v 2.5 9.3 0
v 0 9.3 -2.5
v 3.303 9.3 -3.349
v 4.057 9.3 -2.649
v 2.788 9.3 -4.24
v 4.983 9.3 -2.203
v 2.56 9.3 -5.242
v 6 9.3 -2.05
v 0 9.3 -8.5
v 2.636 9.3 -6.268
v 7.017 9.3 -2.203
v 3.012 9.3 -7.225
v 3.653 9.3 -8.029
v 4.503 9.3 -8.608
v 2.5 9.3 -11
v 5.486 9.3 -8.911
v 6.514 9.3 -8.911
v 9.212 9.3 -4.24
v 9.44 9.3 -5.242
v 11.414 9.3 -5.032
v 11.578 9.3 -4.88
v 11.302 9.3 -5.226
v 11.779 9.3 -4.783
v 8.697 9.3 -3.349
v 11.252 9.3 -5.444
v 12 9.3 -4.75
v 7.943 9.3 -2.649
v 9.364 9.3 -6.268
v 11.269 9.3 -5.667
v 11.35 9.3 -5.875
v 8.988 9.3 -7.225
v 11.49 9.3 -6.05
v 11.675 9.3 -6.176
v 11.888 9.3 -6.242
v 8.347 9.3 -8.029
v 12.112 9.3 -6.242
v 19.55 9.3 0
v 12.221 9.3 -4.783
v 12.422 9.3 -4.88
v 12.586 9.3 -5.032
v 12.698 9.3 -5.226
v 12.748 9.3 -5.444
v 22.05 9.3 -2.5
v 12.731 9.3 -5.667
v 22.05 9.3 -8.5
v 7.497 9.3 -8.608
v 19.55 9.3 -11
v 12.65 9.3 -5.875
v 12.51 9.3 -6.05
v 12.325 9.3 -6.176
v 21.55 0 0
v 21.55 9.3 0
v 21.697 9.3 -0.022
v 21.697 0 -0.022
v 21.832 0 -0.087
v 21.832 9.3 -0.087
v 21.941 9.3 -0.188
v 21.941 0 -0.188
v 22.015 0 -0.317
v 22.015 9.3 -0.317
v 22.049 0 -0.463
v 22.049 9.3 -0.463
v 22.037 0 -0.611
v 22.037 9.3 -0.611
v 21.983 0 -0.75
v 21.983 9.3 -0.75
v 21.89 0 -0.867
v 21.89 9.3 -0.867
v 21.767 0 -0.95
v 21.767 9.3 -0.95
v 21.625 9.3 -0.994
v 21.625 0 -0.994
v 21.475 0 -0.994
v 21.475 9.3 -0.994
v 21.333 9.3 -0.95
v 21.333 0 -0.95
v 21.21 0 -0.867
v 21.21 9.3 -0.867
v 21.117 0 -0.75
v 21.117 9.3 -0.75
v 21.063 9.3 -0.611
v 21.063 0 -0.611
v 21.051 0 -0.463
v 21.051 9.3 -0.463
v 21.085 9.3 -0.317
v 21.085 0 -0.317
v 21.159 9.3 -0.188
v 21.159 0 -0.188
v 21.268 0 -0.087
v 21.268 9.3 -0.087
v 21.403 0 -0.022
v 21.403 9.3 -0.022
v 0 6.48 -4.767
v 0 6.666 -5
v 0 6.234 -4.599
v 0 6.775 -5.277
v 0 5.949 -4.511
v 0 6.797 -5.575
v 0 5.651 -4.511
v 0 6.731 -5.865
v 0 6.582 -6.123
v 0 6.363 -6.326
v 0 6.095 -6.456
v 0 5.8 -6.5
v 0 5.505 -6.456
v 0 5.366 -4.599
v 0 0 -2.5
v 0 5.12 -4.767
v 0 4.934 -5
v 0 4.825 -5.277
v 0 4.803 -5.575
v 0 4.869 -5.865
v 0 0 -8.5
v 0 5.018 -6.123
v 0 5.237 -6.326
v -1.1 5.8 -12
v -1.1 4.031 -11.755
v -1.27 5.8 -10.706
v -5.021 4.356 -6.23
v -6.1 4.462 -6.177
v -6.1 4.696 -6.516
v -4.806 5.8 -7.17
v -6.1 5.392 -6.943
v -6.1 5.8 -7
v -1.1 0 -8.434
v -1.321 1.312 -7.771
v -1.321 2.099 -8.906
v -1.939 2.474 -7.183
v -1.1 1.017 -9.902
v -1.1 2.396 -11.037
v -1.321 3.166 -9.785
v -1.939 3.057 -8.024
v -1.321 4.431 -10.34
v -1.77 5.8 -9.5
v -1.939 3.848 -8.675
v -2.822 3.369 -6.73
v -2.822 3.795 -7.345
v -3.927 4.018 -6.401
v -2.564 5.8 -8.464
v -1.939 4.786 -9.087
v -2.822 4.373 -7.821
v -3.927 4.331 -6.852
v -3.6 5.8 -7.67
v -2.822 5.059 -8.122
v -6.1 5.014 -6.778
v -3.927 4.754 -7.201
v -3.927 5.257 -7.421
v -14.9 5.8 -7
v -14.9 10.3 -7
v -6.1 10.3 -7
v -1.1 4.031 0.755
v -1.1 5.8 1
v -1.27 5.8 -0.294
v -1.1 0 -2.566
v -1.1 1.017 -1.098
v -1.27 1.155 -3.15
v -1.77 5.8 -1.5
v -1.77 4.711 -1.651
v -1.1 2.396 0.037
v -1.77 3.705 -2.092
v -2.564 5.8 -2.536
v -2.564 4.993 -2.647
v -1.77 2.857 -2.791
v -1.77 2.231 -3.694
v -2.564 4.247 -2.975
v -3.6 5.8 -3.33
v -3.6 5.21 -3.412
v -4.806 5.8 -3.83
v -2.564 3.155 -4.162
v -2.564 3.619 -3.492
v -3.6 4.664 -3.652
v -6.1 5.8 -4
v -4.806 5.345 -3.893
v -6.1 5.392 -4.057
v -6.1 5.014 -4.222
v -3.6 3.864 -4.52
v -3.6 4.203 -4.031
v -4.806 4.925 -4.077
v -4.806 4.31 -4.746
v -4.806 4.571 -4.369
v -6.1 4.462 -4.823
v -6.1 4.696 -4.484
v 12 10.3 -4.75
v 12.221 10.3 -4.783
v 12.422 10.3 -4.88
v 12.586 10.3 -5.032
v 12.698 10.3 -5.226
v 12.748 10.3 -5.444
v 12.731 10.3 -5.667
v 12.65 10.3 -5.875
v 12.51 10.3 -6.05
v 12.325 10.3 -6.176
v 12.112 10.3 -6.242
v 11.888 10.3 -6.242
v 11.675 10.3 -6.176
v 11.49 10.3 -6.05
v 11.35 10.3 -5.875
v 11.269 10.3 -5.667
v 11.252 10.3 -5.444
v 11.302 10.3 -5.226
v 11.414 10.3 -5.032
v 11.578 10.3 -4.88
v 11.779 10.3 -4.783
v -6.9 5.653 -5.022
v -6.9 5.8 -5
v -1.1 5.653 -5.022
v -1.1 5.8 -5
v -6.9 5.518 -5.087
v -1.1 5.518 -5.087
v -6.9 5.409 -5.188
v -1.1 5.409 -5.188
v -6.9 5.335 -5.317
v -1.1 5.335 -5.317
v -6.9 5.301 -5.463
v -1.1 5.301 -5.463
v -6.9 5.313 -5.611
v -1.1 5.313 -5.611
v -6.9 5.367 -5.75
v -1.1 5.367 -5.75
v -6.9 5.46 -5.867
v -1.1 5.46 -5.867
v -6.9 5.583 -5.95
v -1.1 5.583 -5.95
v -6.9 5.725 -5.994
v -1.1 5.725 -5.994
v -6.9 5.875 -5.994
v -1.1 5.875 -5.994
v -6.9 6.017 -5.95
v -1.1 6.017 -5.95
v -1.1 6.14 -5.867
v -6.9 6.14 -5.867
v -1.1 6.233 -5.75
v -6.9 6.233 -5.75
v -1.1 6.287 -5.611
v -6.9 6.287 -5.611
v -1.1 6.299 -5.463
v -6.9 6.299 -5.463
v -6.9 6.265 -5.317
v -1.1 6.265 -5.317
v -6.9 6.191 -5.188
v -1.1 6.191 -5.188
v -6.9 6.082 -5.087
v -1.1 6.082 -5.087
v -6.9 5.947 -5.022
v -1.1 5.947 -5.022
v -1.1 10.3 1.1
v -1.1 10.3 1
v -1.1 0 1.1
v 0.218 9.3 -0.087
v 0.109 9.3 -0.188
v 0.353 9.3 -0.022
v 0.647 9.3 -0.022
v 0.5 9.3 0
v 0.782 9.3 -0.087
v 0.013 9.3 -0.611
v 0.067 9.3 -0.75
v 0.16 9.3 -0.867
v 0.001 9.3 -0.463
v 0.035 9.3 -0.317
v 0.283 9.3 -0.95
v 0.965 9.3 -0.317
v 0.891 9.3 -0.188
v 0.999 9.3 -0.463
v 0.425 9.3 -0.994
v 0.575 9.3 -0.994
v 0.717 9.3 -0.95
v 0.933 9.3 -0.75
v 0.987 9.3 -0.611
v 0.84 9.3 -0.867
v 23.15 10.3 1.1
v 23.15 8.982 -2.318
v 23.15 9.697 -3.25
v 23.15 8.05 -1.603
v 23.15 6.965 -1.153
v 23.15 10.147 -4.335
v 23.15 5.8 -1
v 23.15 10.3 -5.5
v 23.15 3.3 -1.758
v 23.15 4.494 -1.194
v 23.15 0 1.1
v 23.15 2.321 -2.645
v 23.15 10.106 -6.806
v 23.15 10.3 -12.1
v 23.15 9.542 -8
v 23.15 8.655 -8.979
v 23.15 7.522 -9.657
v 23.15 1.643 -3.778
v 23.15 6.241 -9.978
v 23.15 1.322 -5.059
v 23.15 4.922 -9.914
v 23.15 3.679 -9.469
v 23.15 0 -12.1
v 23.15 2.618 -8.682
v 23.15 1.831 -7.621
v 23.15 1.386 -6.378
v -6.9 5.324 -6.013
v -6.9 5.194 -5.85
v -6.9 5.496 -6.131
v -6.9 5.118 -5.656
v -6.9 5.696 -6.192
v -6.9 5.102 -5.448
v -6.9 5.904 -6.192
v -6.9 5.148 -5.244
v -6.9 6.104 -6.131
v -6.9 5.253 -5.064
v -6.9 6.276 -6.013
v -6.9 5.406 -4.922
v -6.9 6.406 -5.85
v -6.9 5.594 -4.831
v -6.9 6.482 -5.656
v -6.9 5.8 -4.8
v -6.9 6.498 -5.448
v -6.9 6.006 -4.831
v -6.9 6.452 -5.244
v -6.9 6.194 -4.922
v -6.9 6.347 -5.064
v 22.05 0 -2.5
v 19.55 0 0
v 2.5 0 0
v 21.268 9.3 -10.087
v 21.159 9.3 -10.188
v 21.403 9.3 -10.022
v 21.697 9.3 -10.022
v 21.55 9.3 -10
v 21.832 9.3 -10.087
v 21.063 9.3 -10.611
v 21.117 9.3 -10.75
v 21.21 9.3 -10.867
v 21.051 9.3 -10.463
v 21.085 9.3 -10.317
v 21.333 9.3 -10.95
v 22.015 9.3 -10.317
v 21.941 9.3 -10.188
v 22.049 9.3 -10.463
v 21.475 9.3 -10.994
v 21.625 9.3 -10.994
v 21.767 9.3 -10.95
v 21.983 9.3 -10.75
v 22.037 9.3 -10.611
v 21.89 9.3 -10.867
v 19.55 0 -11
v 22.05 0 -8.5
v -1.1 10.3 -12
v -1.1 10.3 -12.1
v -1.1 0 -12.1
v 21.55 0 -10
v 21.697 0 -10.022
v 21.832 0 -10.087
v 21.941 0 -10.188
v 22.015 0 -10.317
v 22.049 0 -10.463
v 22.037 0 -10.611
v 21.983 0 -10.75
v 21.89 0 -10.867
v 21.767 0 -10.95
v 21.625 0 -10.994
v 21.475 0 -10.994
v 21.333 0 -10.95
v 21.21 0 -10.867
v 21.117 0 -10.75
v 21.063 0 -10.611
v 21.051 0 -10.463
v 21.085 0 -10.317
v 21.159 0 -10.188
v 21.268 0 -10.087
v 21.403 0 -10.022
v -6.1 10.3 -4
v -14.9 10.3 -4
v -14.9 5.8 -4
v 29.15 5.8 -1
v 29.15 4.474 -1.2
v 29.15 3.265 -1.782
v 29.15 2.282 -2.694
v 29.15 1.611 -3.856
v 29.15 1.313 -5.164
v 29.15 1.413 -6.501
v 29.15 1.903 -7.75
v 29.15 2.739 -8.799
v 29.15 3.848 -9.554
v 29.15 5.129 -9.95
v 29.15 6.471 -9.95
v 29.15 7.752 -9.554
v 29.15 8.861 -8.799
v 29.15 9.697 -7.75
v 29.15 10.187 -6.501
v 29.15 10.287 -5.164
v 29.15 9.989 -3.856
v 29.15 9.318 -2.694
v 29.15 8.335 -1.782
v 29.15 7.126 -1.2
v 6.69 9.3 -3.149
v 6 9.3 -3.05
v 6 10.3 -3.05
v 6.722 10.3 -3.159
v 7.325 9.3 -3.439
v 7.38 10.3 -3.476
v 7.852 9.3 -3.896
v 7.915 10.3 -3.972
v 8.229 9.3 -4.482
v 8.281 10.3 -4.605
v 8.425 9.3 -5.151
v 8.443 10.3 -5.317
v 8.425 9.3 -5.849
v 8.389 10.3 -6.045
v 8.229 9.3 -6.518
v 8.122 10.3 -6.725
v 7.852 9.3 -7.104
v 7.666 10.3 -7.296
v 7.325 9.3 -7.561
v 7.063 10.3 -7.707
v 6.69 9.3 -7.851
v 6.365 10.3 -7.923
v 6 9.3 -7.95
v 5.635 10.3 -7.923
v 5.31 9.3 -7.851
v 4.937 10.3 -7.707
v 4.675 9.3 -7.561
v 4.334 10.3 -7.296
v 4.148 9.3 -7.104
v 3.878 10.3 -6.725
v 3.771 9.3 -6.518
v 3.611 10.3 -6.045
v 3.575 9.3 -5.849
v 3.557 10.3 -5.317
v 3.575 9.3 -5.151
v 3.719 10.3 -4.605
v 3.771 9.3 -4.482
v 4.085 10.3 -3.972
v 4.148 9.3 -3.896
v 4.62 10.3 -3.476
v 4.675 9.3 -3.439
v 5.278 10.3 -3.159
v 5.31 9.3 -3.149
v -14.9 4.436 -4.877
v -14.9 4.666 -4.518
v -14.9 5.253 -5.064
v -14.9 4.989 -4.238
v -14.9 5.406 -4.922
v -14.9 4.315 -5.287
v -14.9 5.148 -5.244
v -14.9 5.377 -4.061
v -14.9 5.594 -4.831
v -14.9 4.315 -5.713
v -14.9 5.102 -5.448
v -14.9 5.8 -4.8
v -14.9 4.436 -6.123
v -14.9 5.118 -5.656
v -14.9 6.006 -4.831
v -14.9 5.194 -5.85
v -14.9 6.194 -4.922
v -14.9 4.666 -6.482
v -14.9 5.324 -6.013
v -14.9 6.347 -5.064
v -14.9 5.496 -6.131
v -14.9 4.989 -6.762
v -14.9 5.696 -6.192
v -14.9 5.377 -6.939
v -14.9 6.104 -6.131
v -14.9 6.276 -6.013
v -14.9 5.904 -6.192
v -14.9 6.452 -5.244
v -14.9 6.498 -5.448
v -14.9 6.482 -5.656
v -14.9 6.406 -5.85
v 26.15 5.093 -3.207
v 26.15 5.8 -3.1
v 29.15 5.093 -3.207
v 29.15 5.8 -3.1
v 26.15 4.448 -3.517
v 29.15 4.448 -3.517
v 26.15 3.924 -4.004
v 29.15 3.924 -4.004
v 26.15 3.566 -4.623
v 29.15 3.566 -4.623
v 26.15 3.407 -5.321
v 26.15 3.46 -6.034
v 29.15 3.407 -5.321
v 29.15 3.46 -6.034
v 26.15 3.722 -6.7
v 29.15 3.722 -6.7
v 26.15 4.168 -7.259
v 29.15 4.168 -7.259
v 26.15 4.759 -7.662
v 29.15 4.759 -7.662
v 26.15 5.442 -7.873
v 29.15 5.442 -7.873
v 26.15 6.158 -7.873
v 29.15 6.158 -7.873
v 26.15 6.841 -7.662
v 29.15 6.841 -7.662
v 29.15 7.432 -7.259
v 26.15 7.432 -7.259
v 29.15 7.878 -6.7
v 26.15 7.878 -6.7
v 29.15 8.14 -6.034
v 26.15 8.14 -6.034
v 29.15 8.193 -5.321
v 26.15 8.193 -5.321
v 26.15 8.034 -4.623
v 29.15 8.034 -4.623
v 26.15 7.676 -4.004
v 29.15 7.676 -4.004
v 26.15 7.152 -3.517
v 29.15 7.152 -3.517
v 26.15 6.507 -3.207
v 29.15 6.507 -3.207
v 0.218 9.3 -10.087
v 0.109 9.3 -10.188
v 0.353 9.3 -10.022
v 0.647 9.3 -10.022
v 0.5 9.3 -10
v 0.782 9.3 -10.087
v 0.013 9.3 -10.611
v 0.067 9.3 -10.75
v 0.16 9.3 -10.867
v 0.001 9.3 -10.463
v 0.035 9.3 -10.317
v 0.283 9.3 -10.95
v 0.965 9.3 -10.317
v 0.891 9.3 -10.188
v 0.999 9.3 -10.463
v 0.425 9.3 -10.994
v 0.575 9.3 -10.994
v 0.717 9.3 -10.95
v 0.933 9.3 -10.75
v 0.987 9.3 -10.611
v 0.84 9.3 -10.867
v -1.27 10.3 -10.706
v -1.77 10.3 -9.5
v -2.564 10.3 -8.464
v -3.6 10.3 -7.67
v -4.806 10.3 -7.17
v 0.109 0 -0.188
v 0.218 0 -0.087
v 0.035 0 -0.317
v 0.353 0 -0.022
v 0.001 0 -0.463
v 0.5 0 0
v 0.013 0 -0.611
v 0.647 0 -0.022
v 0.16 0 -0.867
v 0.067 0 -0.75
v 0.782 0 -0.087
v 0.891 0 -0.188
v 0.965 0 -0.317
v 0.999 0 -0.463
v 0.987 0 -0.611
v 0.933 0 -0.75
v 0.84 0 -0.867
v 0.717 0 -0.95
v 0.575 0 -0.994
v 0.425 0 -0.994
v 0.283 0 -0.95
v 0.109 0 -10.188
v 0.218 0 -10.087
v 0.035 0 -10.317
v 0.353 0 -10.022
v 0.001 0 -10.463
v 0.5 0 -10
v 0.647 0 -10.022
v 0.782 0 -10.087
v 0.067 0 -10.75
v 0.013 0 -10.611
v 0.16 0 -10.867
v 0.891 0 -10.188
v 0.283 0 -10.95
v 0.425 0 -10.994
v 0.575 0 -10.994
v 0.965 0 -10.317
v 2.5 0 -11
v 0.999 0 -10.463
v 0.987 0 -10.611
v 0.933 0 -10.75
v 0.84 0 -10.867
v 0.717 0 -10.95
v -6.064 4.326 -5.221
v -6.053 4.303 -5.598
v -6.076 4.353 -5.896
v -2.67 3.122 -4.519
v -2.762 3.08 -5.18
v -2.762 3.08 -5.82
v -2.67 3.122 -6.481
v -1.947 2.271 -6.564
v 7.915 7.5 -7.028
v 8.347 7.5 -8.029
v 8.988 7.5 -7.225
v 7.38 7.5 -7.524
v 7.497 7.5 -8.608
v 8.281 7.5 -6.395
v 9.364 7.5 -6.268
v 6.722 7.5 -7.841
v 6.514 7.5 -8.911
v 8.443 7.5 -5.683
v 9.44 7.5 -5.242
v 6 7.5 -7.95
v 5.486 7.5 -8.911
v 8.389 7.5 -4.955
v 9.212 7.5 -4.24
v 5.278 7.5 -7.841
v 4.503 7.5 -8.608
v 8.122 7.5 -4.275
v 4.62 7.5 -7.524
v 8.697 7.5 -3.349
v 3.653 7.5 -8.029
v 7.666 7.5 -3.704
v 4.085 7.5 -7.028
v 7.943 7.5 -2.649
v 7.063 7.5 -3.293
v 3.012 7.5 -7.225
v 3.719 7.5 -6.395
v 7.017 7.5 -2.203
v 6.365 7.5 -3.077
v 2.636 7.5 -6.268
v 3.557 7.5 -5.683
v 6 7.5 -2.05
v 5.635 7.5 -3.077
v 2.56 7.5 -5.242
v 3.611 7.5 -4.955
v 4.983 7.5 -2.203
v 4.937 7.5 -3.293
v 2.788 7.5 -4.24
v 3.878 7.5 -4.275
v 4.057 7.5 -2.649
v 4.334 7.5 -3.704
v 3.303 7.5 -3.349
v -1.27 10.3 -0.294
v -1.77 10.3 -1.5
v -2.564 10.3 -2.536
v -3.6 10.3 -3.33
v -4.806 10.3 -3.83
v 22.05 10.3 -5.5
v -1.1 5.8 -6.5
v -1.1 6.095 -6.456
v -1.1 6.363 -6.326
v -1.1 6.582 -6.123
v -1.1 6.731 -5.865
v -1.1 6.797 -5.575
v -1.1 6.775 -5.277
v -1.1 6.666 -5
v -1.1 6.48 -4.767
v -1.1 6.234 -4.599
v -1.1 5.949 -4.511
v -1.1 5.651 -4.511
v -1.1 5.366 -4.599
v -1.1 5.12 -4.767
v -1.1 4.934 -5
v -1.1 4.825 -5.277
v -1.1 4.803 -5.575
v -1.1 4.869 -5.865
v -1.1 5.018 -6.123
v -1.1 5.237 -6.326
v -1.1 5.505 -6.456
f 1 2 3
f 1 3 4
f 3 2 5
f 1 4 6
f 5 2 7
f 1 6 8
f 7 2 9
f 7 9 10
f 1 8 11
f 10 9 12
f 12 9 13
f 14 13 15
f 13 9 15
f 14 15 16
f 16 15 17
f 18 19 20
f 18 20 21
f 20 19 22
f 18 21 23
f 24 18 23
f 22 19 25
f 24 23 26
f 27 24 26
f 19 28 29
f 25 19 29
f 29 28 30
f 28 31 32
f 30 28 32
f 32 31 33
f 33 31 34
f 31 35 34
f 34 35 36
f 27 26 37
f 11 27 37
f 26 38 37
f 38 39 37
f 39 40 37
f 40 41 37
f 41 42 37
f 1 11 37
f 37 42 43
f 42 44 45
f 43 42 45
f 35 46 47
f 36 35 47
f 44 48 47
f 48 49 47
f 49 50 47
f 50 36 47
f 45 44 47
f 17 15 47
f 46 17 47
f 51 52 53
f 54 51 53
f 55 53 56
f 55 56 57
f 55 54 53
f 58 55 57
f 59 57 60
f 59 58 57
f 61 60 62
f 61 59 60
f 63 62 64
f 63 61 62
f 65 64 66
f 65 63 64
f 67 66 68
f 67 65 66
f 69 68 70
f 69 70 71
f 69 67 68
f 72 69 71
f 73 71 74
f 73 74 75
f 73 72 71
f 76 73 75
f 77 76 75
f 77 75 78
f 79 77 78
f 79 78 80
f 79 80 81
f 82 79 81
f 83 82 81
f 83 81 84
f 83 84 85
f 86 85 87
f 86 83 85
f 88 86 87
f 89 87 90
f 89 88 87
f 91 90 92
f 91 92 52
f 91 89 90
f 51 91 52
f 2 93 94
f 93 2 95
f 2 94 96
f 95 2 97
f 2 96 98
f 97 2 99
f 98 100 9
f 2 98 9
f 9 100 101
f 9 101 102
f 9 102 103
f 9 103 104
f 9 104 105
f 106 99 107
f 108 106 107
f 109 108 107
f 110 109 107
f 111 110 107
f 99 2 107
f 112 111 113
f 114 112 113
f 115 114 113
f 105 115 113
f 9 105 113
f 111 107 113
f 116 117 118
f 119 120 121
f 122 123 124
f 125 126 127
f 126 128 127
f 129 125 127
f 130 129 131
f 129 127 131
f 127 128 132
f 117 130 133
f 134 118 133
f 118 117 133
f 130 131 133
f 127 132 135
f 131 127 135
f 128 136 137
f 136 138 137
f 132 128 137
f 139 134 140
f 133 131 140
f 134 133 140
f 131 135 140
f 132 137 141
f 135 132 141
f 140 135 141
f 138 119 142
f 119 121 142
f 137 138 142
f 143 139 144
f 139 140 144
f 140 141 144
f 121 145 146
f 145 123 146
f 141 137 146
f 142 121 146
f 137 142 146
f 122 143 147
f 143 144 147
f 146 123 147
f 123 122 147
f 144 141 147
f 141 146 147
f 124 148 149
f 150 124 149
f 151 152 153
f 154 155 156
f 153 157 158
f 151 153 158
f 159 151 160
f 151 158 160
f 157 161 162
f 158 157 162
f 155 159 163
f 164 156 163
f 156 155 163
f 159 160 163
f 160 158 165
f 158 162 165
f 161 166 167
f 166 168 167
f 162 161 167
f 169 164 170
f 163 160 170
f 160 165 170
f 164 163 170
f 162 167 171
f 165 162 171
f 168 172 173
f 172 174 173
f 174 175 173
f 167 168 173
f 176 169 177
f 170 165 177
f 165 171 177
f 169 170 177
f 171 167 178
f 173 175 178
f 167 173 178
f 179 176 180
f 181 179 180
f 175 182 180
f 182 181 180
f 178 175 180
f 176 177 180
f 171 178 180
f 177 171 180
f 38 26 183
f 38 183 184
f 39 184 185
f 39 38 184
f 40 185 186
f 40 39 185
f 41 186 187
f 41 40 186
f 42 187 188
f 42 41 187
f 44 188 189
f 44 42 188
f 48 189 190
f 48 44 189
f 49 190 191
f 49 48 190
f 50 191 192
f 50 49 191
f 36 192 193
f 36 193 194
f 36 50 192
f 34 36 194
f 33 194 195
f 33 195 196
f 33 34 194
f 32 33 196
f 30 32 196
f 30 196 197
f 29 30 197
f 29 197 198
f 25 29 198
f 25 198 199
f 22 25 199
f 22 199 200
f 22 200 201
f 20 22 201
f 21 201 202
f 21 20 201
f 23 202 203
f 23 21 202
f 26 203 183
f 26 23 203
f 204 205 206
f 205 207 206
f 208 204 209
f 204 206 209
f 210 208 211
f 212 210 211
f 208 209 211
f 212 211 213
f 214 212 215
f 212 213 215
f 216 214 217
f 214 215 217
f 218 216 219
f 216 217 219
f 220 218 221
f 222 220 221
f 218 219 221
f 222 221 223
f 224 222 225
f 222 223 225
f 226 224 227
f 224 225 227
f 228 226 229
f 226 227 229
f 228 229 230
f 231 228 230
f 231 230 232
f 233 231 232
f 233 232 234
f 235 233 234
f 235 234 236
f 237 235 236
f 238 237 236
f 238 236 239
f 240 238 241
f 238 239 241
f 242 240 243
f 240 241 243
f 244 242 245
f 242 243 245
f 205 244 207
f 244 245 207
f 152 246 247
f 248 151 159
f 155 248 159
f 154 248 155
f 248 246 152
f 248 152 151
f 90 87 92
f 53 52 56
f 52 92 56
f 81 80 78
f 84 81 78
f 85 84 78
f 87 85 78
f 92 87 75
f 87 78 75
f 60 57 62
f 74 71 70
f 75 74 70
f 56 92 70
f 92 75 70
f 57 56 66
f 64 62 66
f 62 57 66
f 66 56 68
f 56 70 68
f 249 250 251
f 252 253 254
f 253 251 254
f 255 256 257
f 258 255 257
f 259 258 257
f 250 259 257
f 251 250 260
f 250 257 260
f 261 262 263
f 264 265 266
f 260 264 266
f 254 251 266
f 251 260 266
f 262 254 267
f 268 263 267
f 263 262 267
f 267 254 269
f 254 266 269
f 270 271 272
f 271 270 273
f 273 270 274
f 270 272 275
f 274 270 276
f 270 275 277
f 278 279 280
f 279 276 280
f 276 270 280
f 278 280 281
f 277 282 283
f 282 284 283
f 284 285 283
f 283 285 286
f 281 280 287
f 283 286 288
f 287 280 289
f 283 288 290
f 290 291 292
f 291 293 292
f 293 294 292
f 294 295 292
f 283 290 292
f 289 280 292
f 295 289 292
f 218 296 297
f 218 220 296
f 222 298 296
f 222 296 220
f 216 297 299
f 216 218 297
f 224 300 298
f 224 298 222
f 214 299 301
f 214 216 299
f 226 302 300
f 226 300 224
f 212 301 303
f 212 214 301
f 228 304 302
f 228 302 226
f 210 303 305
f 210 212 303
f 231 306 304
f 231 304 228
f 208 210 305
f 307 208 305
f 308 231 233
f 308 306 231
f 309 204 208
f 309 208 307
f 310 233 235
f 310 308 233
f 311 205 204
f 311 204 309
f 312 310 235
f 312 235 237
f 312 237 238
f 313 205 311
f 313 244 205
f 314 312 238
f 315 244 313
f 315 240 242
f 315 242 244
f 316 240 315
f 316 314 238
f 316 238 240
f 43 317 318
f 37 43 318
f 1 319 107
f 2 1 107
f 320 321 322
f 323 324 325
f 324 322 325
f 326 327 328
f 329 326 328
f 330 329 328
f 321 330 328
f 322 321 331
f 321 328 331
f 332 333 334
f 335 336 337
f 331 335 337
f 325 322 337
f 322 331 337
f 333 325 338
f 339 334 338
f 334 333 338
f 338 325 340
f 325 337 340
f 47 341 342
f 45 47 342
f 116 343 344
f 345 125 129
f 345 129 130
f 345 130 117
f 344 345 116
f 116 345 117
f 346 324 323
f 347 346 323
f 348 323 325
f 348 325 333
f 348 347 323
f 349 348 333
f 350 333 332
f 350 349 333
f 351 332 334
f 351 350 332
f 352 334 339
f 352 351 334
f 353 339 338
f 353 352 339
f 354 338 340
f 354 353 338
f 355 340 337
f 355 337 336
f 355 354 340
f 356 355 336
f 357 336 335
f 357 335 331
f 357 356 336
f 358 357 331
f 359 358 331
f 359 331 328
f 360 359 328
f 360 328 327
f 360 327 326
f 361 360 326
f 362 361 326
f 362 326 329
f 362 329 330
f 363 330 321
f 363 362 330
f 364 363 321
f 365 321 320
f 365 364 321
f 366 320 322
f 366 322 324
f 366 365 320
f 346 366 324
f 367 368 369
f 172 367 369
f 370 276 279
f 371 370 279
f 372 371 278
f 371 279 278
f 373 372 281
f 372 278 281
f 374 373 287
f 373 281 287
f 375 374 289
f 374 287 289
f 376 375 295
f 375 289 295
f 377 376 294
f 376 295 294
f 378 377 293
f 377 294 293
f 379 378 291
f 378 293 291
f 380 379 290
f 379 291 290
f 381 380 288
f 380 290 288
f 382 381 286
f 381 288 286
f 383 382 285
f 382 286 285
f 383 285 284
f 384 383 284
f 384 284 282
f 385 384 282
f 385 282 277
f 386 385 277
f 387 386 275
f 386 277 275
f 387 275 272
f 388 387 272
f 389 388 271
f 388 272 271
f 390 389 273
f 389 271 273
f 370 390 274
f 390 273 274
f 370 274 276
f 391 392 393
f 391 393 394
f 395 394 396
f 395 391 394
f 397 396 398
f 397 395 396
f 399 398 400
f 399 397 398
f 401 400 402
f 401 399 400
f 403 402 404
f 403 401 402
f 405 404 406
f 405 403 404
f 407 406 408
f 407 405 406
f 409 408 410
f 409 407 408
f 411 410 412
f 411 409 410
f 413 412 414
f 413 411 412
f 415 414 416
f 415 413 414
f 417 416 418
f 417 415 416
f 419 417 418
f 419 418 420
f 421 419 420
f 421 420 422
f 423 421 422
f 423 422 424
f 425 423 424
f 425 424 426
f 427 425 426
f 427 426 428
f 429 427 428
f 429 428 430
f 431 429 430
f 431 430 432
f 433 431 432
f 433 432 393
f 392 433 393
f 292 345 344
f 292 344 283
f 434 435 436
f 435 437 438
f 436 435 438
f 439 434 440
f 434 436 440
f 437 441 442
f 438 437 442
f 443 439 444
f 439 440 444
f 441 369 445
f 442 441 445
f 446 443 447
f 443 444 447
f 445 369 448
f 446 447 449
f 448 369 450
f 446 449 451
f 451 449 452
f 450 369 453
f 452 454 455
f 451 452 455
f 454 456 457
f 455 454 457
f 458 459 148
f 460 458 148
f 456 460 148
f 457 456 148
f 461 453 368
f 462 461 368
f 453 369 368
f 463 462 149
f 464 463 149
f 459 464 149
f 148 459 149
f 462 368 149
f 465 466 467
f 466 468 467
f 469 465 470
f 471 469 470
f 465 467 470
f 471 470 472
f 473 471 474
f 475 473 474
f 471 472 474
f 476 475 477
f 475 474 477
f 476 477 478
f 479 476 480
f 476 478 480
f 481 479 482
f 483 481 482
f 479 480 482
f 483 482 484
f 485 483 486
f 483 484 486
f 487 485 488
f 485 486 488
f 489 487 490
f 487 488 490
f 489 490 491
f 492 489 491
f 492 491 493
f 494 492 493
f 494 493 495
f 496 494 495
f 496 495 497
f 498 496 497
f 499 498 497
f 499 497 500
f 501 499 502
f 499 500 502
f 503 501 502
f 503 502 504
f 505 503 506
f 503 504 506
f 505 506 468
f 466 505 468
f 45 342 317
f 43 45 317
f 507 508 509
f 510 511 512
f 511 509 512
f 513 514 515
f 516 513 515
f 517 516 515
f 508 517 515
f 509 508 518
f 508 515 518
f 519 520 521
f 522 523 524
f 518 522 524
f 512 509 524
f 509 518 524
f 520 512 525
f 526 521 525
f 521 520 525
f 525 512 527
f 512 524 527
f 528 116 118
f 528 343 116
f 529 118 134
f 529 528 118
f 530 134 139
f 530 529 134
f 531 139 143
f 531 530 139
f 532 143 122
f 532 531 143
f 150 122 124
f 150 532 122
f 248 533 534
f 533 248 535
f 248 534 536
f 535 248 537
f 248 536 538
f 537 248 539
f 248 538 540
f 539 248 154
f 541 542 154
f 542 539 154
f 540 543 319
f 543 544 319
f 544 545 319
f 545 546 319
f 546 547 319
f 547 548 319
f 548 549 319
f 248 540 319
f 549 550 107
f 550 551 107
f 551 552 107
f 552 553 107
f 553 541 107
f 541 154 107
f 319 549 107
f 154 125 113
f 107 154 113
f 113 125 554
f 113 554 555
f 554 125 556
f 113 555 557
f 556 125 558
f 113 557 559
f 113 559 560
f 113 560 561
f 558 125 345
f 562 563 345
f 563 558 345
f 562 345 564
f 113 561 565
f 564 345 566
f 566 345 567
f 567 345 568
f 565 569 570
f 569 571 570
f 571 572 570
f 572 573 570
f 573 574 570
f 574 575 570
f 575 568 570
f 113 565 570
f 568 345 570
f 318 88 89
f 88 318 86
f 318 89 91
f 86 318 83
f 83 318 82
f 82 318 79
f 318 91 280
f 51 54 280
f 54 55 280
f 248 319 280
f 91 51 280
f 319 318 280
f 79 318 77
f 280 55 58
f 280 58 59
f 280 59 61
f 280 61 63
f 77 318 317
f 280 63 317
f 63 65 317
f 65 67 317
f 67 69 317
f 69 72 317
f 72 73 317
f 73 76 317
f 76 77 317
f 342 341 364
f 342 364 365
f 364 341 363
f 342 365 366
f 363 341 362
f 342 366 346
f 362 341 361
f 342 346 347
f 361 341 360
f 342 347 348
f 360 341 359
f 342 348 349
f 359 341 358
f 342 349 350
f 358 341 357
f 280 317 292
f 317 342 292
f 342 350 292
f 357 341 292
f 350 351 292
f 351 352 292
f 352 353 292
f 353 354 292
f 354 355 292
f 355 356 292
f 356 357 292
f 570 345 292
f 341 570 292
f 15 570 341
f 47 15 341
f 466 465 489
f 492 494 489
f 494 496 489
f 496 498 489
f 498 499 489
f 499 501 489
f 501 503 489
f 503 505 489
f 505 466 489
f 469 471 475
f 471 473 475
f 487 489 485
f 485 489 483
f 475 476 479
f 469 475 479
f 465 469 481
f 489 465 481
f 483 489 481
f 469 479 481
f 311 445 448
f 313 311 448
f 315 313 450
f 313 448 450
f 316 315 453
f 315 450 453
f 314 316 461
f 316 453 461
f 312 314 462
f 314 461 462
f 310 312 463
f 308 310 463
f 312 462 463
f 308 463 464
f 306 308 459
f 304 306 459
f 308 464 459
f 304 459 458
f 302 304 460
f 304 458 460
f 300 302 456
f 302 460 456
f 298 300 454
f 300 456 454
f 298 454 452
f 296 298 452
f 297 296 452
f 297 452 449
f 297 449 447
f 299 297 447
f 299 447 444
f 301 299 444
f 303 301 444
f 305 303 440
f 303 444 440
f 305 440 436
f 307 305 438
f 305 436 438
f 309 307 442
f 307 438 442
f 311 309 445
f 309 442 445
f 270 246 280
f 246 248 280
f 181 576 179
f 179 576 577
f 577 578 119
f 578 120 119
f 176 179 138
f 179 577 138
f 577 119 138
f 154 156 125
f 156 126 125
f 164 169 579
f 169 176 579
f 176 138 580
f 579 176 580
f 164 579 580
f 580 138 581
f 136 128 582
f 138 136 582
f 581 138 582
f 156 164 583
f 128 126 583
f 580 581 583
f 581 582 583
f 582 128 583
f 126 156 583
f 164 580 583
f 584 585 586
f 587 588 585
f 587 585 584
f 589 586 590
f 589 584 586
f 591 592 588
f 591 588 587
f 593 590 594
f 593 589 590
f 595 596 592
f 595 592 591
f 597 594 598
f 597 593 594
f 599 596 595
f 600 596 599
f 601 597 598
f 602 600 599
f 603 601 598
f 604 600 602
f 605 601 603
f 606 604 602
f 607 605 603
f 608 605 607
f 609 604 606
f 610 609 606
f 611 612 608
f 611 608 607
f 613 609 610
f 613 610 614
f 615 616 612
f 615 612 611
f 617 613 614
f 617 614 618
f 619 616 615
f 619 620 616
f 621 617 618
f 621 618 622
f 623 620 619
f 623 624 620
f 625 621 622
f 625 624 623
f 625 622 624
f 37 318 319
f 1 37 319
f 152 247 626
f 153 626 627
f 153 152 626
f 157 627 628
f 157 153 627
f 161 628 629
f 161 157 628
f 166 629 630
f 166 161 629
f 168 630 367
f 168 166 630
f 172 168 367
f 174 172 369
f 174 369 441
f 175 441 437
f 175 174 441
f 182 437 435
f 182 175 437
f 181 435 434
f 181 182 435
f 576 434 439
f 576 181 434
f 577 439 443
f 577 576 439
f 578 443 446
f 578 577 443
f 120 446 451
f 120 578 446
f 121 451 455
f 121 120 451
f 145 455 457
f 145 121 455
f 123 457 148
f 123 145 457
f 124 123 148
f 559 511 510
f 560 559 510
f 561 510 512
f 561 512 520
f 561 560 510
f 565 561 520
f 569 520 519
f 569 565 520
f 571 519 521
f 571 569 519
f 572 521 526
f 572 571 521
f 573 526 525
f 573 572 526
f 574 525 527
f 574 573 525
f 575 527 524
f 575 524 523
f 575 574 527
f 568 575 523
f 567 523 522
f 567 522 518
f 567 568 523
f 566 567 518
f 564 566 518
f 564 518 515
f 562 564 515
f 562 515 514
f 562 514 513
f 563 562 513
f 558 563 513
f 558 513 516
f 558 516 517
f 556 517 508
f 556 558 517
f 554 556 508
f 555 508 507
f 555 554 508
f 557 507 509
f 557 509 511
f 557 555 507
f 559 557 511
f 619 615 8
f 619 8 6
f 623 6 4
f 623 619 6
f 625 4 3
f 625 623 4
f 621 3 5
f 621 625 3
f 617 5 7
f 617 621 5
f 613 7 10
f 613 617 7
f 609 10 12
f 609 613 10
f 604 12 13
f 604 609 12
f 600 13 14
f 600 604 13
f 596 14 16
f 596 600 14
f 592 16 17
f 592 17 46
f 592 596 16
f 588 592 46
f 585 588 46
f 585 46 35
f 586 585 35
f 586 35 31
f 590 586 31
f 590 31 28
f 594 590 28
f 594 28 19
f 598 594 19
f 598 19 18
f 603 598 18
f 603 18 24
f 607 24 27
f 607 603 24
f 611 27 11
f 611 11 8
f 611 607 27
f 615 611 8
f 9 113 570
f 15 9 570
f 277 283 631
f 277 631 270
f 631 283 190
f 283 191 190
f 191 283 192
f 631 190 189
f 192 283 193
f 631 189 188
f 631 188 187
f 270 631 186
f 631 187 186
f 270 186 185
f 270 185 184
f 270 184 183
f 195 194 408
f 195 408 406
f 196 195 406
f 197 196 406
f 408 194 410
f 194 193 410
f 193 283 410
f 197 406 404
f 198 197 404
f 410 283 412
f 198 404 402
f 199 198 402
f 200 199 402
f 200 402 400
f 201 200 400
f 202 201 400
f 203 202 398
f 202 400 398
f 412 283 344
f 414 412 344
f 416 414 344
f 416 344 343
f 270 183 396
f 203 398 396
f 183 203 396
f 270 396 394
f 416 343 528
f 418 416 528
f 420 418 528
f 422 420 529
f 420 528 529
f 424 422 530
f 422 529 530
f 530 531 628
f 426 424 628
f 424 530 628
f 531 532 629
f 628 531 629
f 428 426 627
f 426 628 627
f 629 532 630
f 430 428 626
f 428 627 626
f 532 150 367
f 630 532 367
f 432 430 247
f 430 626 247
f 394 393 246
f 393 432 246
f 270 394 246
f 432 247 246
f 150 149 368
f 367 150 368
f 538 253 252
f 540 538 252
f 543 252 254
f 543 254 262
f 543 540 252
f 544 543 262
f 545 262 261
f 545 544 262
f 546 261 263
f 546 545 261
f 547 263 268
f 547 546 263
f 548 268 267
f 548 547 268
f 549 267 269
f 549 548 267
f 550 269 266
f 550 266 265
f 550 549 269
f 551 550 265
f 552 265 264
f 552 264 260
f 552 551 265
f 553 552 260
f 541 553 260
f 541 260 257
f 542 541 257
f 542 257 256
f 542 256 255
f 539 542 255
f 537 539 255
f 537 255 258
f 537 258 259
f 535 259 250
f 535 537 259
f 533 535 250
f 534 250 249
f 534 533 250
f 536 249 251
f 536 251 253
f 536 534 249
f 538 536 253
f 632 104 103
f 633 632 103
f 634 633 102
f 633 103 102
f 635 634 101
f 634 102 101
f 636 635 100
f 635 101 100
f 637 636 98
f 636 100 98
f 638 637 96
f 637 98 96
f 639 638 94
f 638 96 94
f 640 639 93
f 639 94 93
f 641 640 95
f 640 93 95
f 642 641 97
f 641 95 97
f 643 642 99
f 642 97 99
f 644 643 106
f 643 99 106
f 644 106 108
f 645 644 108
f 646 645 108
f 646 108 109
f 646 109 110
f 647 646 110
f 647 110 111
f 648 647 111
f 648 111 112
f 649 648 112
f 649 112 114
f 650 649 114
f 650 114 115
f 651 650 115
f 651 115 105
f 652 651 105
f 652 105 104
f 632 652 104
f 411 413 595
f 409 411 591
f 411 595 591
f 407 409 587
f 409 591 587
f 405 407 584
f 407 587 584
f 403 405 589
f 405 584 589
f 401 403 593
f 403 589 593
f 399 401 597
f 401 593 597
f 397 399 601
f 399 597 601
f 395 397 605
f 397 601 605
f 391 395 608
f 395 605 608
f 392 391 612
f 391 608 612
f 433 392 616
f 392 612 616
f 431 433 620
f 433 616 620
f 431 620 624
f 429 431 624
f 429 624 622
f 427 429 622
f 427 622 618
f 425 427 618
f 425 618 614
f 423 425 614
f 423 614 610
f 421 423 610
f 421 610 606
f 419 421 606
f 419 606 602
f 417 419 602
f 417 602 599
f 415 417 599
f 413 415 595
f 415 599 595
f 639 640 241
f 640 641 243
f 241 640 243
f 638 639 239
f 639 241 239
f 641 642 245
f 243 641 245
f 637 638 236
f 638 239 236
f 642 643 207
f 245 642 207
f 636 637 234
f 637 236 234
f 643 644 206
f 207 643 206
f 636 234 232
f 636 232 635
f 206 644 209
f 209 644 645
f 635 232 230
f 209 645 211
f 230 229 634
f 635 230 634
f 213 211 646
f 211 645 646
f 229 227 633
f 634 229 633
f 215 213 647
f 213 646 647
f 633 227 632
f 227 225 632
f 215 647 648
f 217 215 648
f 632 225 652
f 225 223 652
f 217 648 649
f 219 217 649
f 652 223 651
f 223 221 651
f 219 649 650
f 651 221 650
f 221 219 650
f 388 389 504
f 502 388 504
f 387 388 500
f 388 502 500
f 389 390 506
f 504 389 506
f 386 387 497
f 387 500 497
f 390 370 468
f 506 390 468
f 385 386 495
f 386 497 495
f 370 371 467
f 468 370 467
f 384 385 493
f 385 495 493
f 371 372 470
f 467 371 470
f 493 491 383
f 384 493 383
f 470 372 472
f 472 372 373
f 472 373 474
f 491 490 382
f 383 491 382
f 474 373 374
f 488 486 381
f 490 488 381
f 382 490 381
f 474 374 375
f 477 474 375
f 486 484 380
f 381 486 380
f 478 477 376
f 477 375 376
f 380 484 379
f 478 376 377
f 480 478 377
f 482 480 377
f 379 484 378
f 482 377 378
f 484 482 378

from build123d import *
from build123d.topology import SkipClean

# Parameters (mm, degrees)
ESQUISSE2_W             = 24.25
ESQUISSE2_H             = 13.2
ESQUISSE2_R             = 0.5
BOSS_EXTRU_1_DEPTH      = 9.3
ESQUISSE3_W             = 24.25
ESQUISSE3_H             = 13.2
ESQUISSE3_R             = 2.45
ESQUISSE3_R_2           = 0.75
BOSS_EXTRU_2_DEPTH      = 1
ESQUISSE4_R             = 1
ENL_V_MAT_EXTRU_1_DEPTH = 29.992455915
ESQUISSE5_W             = 13.8
ESQUISSE5_H             = 1
BOSS_EXTRU_3_DEPTH      = 13.8
CONG_1_R                = 5
BOSS_EXTRU_4_START      = 1.8
ESQUISSE8_R             = 3.45
ESQUISSE8_R_2           = 2.45
BOSS_EXTRU_4_DEPTH      = 1.8
ESQUISSE9_R             = 0.7
ENL_V_MAT_EXTRU_2_DEPTH = 8


with BuildPart() as part:
    # Esquisse2 → Boss.-Extru.1 (new body)
    with BuildSketch(Plane(origin=(0, 0, 0), x_dir=(1, 0, 0), z_dir=(0, 1, 0))):
        with Locations((11.025, 5.5)):
            Rectangle(ESQUISSE2_W, ESQUISSE2_H)
        Polygon((0, 8.5), (2.5, 11), (19.55, 11), (22.05, 8.5), (22.05, 2.5), (19.55, 0), (2.5, 0), (0, 2.5), align=None, mode=Mode.SUBTRACT)
        with Locations(Location((0.5, 10.5, 0), (0, 0, 270))):
            Circle(ESQUISSE2_R, mode=Mode.SUBTRACT)
        with Locations(Location((21.55, 10.5, 0), (0, 0, 270))):
            Circle(ESQUISSE2_R, mode=Mode.SUBTRACT)
        with Locations(Location((0.5, 0.5, 0), (0, 0, 270))):
            Circle(ESQUISSE2_R, mode=Mode.SUBTRACT)
        with Locations(Location((21.55, 0.5, 0), (0, 0, 270))):
            Circle(ESQUISSE2_R, mode=Mode.SUBTRACT)
    extrude(amount=BOSS_EXTRU_1_DEPTH)

    # Esquisse3 → Boss.-Extru.2 (add)
    with BuildSketch(Plane(origin=(0, 9.3, 0), x_dir=(1, 0, 0), z_dir=(0, 1, 0))):
        with Locations((11.025, 5.5)):
            Rectangle(ESQUISSE3_W, ESQUISSE3_H)
        with Locations(Location((6, 5.5, 0), (0, 0, 270))):
            Circle(ESQUISSE3_R, mode=Mode.SUBTRACT)
        with Locations(Location((12, 5.5, 0), (0, 0, 270))):
            Circle(ESQUISSE3_R_2, mode=Mode.SUBTRACT)
    extrude(amount=BOSS_EXTRU_2_DEPTH)

    # Esquisse4 → Enlèv. mat.-Extru.1 (cut, through all)
    with BuildSketch(Plane(origin=(23.15, 0, 0), x_dir=(0, 0, -1), z_dir=(1, 0, 0))):
        with Locations((5.5, 5.8)):
            Circle(ESQUISSE4_R)
    extrude(amount=-ENL_V_MAT_EXTRU_1_DEPTH, mode=Mode.SUBTRACT)

    # Esquisse5 → Révolution1 (revolve)
    with BuildSketch(Plane.XY.offset(-5.5), mode=Mode.PRIVATE) as r_volution1_sk:
        with Locations((-8, 6.8)):
            Rectangle(ESQUISSE5_W, ESQUISSE5_H)
        Polygon((22.05, 10.3), (22.05, 5.8), (26.15, 5.8), (26.15, 8.2), (29.15, 8.2), (29.15, 10.3), align=None)
    revolve(r_volution1_sk.sketch.rotate(Axis((-19.031616201, 5.8, -5.5), (1, 0, 0)), 90), axis=Axis((-19.031616201, 5.8, -5.5), (1, 0, 0)))

    # Esquisse6 → Boss.-Extru.3 (add)
    with BuildSketch(Plane.ZY.offset(14.9)):
        with BuildLine():
            Line((-7, 5.8), (-7, 10.3))
            Line((-7, 10.3), (-4, 10.3))
            Line((-4, 10.3), (-4, 5.8))
            ThreePointArc((-4, 5.8), (-5.5, 7.3), (-7, 5.8))
        make_face()
    extrude(amount=-BOSS_EXTRU_3_DEPTH)

    # Congé1
    cong_1_edges = [part.edges().sort_by_distance(p)[0] for p in [
        (-1.1, 8.05, -4),
        (-1.1, 8.05, -7),
        (-1.1, 4.3, -5.5),
    ]]
    fillet(cong_1_edges, radius=CONG_1_R)

    # Esquisse8 → Boss.-Extru.4 (add)
    with SkipClean():  # the faces are left unmerged after this step: merging them gives an invalid solid
        with BuildSketch(Plane.XZ.offset(-9.3).offset(BOSS_EXTRU_4_START)):
            with Locations(Location((6, -5.5, 0), (0, 0, 90))):
                Circle(ESQUISSE8_R)
            with Locations(Location((6, -5.5, 0), (0, 0, 270))):
                Circle(ESQUISSE8_R_2, mode=Mode.SUBTRACT)
        extrude(amount=-BOSS_EXTRU_4_DEPTH)

    # Esquisse9 → Enlèv. mat.-Extru.2 (cut)
    with SkipClean():  # the faces are left unmerged after this step: merging them gives an invalid solid
        with BuildSketch(Plane.ZY.offset(14.9)):
            with Locations((-5.5, 5.8)):
                Circle(ESQUISSE9_R)
        extrude(amount=-ENL_V_MAT_EXTRU_2_DEPTH, mode=Mode.SUBTRACT)


solid = part.part
